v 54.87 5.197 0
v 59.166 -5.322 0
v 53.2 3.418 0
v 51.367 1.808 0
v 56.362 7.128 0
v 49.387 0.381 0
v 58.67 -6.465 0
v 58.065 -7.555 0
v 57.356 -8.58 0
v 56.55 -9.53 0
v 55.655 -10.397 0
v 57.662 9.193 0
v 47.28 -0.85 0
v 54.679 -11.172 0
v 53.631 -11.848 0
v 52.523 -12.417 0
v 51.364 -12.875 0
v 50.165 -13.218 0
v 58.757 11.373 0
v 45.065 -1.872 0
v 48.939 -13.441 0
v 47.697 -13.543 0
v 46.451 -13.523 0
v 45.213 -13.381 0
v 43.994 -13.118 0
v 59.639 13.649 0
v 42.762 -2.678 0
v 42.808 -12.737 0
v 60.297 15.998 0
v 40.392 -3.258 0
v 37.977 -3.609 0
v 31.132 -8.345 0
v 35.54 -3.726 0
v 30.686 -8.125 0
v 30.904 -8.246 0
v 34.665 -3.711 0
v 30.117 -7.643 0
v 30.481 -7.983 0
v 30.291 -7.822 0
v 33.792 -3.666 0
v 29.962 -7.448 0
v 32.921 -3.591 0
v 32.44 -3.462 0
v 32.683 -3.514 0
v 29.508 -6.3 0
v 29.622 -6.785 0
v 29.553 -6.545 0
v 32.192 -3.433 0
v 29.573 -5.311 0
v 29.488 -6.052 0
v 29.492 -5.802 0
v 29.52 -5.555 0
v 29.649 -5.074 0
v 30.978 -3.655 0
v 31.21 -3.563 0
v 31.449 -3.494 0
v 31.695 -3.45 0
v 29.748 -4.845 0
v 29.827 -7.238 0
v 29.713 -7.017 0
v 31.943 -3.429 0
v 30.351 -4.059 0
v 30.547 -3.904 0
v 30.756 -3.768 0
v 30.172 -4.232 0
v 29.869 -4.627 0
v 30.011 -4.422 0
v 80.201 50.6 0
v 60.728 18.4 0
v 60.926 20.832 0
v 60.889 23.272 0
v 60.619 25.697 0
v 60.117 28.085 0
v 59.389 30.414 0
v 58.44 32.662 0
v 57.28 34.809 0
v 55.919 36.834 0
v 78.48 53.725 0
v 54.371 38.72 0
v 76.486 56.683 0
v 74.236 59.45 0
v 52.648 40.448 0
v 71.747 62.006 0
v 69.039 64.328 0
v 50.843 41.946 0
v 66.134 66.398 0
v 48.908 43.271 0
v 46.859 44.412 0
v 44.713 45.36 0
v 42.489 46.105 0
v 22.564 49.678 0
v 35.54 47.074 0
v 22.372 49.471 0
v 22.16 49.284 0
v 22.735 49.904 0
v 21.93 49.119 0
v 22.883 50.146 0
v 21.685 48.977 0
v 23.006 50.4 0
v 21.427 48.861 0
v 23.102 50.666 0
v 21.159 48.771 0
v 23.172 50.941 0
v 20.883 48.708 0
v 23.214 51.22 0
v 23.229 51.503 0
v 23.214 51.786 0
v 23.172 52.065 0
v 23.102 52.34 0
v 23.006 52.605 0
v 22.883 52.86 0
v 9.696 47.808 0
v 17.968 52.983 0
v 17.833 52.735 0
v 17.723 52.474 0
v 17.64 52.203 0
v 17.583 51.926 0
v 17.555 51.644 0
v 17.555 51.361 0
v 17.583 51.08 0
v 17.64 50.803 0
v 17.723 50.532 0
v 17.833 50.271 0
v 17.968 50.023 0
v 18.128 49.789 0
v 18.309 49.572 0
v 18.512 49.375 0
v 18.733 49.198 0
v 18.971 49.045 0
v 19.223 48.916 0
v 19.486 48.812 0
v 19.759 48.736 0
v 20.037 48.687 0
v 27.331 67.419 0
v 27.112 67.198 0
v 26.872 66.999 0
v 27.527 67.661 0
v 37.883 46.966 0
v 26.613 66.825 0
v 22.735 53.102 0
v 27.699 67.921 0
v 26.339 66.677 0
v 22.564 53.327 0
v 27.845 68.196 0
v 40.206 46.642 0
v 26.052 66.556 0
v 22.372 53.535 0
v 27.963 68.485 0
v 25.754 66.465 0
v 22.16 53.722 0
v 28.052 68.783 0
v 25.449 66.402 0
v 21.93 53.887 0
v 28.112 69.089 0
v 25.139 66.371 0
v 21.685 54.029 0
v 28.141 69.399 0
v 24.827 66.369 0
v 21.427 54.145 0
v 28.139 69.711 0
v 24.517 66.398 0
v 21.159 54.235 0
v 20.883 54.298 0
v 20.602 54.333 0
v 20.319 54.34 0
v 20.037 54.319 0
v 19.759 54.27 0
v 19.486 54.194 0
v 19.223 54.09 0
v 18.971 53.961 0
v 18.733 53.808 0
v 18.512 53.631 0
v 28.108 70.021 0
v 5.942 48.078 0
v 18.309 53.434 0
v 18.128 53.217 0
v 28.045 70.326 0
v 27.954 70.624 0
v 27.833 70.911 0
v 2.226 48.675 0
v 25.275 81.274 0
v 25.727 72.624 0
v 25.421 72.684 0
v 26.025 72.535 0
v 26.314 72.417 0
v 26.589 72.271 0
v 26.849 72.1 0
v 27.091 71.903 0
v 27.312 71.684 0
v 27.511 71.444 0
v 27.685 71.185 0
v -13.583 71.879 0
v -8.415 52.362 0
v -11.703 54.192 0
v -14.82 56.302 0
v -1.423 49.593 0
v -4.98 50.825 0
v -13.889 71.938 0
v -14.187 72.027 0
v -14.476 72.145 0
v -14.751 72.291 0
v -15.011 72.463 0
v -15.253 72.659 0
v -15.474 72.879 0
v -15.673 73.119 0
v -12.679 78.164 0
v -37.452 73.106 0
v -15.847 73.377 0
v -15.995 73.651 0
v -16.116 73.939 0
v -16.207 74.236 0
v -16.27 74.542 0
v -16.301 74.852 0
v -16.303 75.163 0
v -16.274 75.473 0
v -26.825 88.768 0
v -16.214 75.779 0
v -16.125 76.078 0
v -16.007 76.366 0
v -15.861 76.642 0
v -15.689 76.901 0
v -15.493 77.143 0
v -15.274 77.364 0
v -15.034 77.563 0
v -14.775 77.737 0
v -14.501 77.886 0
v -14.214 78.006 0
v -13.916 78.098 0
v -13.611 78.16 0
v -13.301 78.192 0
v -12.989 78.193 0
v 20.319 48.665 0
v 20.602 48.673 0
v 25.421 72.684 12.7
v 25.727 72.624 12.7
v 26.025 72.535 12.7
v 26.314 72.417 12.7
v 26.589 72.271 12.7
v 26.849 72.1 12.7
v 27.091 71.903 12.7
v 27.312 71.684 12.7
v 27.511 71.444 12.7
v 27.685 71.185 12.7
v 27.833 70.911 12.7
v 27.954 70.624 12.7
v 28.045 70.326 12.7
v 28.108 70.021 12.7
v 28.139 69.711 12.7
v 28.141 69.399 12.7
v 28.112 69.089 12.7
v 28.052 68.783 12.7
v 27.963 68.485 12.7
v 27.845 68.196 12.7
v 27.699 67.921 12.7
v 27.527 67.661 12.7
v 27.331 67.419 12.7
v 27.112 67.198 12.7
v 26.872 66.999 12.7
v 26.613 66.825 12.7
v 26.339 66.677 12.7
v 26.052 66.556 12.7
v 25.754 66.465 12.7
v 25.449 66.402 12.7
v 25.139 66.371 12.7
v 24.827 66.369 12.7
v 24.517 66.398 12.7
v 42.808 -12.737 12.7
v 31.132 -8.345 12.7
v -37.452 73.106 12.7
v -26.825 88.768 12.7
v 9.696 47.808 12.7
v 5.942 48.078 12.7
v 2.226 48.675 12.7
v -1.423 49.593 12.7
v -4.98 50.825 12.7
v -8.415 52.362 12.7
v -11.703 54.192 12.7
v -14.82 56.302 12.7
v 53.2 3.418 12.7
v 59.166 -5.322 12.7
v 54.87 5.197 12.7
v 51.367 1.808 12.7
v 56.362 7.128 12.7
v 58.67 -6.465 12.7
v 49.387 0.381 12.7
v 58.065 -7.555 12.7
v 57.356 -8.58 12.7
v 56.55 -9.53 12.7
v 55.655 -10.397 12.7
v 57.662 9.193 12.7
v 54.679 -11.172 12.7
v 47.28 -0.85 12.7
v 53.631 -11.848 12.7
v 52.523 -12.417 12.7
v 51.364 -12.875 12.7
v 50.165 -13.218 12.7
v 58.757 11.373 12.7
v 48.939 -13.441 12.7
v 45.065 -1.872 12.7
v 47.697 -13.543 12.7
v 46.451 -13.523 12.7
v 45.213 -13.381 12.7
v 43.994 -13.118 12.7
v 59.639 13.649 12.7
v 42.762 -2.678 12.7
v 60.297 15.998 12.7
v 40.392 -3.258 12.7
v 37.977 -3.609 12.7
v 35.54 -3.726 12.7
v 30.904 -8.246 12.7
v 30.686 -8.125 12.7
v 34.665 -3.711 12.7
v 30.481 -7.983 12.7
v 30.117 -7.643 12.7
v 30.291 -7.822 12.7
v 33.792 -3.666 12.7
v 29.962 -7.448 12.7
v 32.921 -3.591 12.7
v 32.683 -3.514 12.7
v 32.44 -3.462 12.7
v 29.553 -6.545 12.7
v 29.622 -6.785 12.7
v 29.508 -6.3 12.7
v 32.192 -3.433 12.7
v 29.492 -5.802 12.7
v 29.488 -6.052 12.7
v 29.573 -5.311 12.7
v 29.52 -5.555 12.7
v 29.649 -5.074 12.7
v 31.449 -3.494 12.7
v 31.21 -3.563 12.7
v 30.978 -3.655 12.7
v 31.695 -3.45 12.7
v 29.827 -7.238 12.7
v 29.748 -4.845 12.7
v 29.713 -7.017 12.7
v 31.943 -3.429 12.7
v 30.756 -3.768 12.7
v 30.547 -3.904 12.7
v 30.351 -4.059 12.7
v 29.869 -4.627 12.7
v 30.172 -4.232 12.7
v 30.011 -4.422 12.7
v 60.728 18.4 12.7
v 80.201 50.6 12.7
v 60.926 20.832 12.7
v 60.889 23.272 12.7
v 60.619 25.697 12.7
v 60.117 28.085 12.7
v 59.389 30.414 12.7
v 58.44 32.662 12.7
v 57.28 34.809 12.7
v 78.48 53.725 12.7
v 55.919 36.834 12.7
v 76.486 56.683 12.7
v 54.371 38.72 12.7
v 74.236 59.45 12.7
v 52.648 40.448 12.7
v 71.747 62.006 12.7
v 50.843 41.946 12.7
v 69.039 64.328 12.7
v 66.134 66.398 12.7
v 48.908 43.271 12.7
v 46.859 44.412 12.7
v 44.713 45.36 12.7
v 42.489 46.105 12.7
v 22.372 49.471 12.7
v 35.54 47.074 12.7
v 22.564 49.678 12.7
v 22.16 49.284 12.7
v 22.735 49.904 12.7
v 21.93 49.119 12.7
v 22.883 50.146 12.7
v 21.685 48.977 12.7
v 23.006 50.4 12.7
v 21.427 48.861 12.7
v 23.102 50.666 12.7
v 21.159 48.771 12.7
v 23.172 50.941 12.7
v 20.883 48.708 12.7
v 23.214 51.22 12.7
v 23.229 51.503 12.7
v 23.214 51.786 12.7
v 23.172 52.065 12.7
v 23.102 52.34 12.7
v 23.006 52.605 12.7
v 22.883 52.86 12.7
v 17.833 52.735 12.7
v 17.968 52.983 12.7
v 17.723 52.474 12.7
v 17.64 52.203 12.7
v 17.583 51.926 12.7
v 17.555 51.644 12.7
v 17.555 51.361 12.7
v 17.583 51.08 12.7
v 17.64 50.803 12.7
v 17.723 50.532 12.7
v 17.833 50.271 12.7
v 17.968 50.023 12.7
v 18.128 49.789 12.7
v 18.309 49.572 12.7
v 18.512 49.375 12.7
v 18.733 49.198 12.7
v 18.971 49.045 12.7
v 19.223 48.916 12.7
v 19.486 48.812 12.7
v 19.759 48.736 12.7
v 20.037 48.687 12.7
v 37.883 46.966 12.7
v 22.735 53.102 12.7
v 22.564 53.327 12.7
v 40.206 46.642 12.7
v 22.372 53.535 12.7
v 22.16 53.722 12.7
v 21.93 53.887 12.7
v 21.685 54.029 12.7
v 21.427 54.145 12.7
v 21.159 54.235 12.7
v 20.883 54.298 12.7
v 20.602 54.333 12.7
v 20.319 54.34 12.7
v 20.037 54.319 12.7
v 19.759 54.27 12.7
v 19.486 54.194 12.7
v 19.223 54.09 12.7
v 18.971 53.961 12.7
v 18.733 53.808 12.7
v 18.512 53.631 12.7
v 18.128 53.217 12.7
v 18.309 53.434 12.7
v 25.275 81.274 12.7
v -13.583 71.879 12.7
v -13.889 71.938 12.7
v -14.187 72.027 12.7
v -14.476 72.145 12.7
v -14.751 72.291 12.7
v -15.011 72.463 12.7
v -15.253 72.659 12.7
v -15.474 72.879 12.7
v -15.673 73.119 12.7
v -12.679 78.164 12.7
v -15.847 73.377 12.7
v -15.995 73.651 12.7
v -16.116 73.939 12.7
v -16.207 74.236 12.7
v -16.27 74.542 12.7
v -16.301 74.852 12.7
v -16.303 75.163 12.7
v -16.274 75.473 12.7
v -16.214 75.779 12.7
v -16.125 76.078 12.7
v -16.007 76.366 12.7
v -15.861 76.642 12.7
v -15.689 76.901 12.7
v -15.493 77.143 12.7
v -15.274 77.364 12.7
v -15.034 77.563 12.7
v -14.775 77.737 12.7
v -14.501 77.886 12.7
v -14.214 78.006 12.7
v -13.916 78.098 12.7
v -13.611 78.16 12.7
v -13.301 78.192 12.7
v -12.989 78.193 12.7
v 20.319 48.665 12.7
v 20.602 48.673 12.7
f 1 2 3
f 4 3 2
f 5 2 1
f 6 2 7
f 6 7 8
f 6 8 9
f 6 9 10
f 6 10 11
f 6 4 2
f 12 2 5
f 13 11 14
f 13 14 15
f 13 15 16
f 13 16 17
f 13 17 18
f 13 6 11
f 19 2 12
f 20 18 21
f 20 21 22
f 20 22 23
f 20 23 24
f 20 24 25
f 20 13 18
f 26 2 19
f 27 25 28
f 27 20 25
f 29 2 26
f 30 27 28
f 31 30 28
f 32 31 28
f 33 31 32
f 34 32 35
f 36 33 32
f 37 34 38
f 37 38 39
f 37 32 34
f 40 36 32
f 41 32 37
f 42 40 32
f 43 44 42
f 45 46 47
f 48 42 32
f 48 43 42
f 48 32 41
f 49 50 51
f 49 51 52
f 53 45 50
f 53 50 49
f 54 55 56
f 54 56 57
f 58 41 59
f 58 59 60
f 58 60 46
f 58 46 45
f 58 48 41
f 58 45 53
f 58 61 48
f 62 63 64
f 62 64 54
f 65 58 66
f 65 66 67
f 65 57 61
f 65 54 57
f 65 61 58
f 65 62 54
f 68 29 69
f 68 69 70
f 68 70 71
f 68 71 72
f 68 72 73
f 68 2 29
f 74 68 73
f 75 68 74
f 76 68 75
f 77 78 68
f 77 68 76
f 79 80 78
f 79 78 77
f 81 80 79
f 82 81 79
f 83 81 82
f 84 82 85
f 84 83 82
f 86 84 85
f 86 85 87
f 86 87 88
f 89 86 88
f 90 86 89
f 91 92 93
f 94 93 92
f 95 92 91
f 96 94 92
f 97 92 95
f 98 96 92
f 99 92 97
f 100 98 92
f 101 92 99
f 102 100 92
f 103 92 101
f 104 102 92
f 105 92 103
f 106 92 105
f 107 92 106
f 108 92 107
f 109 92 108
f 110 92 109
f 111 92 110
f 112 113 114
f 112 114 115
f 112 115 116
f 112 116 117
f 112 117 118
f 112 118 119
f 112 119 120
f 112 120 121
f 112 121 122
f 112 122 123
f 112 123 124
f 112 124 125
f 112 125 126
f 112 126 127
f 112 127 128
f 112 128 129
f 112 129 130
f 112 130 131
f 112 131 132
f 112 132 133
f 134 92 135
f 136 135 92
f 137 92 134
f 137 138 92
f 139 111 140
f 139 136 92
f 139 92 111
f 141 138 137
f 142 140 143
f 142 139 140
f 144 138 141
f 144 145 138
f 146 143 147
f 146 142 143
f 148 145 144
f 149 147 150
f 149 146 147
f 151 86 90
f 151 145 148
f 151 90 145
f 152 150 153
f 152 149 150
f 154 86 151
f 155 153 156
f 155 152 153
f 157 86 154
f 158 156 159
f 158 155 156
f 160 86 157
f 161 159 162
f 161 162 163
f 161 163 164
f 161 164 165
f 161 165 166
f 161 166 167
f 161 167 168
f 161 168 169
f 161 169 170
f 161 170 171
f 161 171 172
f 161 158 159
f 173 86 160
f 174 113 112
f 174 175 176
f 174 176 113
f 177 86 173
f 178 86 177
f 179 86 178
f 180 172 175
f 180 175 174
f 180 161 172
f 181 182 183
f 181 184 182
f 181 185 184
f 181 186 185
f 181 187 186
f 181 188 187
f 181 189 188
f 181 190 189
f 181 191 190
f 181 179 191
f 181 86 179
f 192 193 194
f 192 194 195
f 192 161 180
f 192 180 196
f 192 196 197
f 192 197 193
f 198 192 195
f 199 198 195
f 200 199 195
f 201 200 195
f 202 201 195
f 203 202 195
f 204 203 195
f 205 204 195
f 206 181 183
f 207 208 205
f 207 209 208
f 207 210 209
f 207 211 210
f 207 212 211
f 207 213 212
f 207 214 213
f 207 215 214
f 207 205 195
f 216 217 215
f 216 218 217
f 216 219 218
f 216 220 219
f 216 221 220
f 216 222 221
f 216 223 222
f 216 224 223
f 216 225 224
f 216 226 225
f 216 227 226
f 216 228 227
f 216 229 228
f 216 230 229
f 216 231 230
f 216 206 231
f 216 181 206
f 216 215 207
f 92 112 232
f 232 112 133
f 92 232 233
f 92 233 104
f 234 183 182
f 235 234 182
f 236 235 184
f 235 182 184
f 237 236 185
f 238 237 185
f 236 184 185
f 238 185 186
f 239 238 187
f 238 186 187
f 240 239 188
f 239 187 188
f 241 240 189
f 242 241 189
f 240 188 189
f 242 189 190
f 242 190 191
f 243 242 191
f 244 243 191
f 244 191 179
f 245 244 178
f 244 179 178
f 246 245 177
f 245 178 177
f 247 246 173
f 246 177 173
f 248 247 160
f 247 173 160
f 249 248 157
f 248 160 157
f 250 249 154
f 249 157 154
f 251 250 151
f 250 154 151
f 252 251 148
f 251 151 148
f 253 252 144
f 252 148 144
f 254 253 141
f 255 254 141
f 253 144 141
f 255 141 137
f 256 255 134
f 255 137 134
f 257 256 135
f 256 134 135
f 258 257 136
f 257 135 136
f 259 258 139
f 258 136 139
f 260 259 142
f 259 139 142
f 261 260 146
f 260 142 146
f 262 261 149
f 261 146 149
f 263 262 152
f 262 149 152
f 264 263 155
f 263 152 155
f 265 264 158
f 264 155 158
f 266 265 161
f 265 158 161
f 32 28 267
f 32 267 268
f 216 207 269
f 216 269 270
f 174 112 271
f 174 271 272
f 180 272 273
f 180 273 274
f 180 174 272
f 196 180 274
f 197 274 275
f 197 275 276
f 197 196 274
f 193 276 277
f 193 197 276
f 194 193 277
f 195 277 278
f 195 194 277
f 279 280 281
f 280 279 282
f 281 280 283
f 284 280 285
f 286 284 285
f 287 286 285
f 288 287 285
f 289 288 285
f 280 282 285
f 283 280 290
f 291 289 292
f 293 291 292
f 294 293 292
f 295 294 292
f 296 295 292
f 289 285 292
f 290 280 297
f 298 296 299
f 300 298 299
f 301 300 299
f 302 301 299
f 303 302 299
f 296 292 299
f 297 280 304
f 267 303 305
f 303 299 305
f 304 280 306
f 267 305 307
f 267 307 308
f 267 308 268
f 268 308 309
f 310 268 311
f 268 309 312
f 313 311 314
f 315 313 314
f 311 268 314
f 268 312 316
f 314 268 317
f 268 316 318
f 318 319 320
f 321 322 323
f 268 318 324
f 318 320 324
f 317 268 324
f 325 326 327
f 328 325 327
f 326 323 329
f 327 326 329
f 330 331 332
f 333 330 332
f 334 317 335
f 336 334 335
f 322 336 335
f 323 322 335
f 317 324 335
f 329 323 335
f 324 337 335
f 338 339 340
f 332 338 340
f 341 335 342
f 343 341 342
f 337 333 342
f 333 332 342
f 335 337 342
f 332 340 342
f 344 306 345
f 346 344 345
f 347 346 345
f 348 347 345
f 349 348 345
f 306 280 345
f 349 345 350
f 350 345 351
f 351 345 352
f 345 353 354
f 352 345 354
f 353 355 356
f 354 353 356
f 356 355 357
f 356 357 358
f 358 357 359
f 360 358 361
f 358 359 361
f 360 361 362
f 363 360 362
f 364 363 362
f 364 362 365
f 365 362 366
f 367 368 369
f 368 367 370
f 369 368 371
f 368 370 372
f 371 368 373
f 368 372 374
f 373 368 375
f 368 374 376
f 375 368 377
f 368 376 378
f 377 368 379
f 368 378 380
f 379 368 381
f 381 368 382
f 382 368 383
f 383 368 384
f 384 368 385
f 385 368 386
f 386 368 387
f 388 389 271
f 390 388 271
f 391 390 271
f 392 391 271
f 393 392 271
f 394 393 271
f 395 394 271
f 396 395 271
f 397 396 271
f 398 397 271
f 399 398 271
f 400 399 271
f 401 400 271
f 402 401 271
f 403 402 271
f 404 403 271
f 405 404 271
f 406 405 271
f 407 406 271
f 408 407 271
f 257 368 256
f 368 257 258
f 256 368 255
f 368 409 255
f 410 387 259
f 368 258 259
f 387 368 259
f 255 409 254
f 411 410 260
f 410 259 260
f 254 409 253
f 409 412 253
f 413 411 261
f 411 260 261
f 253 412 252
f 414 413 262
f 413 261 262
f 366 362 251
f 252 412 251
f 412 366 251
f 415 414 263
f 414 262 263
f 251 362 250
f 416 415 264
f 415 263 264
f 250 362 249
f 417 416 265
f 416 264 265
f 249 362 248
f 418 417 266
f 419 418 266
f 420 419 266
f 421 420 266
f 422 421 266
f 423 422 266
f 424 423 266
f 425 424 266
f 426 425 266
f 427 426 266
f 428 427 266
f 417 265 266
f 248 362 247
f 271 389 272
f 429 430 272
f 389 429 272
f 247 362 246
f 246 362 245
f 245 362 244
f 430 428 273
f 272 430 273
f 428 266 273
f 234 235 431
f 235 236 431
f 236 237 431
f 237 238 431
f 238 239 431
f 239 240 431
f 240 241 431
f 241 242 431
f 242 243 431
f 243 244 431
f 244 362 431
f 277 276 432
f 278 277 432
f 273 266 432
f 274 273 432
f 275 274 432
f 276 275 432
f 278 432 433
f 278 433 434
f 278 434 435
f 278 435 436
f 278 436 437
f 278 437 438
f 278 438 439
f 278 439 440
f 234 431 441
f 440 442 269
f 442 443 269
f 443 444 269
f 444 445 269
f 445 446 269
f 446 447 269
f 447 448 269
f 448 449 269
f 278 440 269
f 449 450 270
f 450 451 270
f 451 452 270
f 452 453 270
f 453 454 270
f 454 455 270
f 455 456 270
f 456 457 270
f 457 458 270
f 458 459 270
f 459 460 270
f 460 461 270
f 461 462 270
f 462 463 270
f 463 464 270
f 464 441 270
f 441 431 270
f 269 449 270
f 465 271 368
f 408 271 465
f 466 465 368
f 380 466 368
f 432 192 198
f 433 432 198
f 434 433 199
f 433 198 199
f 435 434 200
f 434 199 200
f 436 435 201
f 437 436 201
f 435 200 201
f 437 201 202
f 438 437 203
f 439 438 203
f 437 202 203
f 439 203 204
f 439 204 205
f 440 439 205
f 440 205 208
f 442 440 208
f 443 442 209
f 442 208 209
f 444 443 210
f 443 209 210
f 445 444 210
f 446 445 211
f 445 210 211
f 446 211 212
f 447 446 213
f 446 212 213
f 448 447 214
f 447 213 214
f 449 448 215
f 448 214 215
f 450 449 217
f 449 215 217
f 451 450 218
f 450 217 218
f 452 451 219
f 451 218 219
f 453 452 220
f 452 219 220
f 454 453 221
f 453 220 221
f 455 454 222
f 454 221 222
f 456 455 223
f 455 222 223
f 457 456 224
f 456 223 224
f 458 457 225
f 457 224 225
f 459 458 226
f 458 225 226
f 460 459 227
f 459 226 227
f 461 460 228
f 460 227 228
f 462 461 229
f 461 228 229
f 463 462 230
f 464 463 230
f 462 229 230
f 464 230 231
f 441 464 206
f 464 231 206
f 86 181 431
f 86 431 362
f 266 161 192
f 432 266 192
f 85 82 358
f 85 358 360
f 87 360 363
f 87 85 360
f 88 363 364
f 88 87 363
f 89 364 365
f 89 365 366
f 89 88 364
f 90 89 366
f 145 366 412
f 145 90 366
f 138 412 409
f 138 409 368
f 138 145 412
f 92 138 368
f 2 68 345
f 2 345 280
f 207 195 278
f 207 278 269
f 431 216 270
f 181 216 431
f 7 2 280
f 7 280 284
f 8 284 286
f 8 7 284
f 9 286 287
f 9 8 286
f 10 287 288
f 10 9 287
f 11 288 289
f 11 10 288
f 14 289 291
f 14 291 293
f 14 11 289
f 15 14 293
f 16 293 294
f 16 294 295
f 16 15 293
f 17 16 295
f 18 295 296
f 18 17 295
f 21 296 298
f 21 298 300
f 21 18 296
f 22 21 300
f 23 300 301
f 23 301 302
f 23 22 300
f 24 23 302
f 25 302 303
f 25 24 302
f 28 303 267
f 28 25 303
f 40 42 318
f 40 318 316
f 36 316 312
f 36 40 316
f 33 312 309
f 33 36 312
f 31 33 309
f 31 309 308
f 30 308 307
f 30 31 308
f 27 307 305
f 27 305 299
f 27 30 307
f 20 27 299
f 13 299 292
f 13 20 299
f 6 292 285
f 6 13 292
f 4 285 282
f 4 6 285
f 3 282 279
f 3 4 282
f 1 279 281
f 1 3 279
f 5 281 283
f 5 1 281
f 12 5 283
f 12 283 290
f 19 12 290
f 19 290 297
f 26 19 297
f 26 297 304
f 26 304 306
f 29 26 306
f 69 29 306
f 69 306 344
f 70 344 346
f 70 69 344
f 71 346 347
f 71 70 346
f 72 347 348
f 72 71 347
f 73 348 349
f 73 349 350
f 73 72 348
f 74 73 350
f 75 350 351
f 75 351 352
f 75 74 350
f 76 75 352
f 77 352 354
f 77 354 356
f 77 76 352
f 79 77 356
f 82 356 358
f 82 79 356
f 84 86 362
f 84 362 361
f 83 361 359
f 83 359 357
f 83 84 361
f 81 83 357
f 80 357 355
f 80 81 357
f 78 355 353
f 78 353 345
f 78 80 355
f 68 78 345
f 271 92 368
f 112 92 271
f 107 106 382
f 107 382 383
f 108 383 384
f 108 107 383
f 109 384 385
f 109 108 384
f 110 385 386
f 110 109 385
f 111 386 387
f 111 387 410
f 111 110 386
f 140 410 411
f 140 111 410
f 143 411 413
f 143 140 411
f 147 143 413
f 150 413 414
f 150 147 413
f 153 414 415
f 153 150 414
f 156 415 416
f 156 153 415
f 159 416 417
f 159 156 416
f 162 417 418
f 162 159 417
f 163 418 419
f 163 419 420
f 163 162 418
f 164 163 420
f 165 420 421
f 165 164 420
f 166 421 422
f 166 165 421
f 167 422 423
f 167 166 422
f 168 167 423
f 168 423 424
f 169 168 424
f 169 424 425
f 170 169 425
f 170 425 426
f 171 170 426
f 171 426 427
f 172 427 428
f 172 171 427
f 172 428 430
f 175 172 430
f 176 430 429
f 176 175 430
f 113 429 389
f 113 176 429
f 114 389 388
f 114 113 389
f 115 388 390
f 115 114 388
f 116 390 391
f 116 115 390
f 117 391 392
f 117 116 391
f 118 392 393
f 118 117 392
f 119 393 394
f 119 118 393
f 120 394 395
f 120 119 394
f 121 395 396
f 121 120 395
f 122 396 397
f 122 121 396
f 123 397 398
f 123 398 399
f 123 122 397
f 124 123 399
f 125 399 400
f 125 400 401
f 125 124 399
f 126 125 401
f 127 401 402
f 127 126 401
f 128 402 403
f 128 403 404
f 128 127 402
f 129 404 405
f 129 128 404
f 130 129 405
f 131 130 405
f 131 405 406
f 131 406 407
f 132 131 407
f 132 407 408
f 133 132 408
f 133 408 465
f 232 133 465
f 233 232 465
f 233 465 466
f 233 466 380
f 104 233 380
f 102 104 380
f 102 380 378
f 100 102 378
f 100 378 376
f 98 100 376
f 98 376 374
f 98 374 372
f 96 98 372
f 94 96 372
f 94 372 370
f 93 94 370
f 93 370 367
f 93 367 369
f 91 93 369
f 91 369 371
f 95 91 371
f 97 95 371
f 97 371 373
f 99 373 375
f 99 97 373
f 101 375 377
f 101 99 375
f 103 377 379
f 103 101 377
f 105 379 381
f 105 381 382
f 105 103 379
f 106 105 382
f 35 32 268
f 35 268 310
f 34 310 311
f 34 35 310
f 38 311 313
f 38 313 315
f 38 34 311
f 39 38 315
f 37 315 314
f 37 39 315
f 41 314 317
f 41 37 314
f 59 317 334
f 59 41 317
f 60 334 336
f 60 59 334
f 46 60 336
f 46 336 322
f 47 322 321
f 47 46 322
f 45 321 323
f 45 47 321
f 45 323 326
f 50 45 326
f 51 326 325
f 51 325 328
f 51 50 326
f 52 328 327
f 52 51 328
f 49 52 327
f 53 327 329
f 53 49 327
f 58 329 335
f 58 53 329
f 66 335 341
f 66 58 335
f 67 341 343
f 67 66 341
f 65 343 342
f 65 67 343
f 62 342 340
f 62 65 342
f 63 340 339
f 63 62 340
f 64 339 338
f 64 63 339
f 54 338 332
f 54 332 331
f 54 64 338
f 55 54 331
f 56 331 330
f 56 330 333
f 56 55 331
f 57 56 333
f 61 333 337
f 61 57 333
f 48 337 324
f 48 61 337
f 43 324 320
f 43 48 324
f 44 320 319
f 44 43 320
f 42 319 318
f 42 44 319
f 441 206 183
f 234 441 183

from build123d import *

# Parameters (mm, degrees)
SKETCH1_R           = 2.838382548
BOSS_EXTRUDE2_DEPTH = 12.7


with BuildPart() as part:
    # Sketch1 → Boss-Extrude2 (new body)
    with BuildSketch(Plane.XY):
        with BuildLine():
            Line((-26.824587008, 88.76822773), (25.274610138, 81.274279665))
            Line((25.274610138, 81.274279665), (66.134216336, 66.398380962))
            ThreePointArc((66.134216336, 66.398380962), (74.236045161, 59.4504343), (80.201058977, 50.599886109))
            Line((80.201058977, 50.599886109), (59.165982949, -5.321540814))
            ThreePointArc((59.165982949, -5.321540814), (52.522719394, -12.417211597), (42.807825757, -12.737111817))
            Line((42.807825757, -12.737111817), (31.132290646, -8.345310995))
            ThreePointArc((31.132290646, -8.345310995), (29.649176446, -5.073679556), (32.920807884, -3.590565356))
            ThreePointArc((32.920807884, -3.590565356), (34.228479037, -3.692067968), (35.539646393, -3.725932272))
            ThreePointArc((35.539646393, -3.725932272), (59.225238989, 12.500589471), (52.648250228, 40.447870615))
            ThreePointArc((52.648250228, 40.447870615), (44.71312465, 45.359660325), (35.539646393, 47.074067728))
            Line((35.539646393, 47.074067728), (9.696061009, 47.807757753))
            ThreePointArc((9.696061009, 47.807757753), (-3.214919538, 50.169926542), (-14.819759488, 56.301887878))
            Line((-14.819759488, 56.301887878), (-37.452223969, 73.106391791))
            Line((-37.452223969, 73.106391791), (-26.824587008, 88.76822773))
        make_face()
        with Locations((20.390142766, 51.502972215)):
            Circle(SKETCH1_R, mode=Mode.SUBTRACT)
        with BuildLine():
            Line((24.516957739, 66.398380962), (-13.583042261, 71.878684632))
            ThreePointArc((-13.583042261, 71.878684632), (-16.273658443, 75.473379968), (-12.678963107, 78.16399615))
            Line((-12.678963107, 78.16399615), (25.421036893, 72.68369248))
            ThreePointArc((25.421036893, 72.68369248), (28.111653075, 69.088997144), (24.516957739, 66.398380962))
        make_face(mode=Mode.SUBTRACT)
    extrude(amount=BOSS_EXTRUDE2_DEPTH)


solid = part.part
